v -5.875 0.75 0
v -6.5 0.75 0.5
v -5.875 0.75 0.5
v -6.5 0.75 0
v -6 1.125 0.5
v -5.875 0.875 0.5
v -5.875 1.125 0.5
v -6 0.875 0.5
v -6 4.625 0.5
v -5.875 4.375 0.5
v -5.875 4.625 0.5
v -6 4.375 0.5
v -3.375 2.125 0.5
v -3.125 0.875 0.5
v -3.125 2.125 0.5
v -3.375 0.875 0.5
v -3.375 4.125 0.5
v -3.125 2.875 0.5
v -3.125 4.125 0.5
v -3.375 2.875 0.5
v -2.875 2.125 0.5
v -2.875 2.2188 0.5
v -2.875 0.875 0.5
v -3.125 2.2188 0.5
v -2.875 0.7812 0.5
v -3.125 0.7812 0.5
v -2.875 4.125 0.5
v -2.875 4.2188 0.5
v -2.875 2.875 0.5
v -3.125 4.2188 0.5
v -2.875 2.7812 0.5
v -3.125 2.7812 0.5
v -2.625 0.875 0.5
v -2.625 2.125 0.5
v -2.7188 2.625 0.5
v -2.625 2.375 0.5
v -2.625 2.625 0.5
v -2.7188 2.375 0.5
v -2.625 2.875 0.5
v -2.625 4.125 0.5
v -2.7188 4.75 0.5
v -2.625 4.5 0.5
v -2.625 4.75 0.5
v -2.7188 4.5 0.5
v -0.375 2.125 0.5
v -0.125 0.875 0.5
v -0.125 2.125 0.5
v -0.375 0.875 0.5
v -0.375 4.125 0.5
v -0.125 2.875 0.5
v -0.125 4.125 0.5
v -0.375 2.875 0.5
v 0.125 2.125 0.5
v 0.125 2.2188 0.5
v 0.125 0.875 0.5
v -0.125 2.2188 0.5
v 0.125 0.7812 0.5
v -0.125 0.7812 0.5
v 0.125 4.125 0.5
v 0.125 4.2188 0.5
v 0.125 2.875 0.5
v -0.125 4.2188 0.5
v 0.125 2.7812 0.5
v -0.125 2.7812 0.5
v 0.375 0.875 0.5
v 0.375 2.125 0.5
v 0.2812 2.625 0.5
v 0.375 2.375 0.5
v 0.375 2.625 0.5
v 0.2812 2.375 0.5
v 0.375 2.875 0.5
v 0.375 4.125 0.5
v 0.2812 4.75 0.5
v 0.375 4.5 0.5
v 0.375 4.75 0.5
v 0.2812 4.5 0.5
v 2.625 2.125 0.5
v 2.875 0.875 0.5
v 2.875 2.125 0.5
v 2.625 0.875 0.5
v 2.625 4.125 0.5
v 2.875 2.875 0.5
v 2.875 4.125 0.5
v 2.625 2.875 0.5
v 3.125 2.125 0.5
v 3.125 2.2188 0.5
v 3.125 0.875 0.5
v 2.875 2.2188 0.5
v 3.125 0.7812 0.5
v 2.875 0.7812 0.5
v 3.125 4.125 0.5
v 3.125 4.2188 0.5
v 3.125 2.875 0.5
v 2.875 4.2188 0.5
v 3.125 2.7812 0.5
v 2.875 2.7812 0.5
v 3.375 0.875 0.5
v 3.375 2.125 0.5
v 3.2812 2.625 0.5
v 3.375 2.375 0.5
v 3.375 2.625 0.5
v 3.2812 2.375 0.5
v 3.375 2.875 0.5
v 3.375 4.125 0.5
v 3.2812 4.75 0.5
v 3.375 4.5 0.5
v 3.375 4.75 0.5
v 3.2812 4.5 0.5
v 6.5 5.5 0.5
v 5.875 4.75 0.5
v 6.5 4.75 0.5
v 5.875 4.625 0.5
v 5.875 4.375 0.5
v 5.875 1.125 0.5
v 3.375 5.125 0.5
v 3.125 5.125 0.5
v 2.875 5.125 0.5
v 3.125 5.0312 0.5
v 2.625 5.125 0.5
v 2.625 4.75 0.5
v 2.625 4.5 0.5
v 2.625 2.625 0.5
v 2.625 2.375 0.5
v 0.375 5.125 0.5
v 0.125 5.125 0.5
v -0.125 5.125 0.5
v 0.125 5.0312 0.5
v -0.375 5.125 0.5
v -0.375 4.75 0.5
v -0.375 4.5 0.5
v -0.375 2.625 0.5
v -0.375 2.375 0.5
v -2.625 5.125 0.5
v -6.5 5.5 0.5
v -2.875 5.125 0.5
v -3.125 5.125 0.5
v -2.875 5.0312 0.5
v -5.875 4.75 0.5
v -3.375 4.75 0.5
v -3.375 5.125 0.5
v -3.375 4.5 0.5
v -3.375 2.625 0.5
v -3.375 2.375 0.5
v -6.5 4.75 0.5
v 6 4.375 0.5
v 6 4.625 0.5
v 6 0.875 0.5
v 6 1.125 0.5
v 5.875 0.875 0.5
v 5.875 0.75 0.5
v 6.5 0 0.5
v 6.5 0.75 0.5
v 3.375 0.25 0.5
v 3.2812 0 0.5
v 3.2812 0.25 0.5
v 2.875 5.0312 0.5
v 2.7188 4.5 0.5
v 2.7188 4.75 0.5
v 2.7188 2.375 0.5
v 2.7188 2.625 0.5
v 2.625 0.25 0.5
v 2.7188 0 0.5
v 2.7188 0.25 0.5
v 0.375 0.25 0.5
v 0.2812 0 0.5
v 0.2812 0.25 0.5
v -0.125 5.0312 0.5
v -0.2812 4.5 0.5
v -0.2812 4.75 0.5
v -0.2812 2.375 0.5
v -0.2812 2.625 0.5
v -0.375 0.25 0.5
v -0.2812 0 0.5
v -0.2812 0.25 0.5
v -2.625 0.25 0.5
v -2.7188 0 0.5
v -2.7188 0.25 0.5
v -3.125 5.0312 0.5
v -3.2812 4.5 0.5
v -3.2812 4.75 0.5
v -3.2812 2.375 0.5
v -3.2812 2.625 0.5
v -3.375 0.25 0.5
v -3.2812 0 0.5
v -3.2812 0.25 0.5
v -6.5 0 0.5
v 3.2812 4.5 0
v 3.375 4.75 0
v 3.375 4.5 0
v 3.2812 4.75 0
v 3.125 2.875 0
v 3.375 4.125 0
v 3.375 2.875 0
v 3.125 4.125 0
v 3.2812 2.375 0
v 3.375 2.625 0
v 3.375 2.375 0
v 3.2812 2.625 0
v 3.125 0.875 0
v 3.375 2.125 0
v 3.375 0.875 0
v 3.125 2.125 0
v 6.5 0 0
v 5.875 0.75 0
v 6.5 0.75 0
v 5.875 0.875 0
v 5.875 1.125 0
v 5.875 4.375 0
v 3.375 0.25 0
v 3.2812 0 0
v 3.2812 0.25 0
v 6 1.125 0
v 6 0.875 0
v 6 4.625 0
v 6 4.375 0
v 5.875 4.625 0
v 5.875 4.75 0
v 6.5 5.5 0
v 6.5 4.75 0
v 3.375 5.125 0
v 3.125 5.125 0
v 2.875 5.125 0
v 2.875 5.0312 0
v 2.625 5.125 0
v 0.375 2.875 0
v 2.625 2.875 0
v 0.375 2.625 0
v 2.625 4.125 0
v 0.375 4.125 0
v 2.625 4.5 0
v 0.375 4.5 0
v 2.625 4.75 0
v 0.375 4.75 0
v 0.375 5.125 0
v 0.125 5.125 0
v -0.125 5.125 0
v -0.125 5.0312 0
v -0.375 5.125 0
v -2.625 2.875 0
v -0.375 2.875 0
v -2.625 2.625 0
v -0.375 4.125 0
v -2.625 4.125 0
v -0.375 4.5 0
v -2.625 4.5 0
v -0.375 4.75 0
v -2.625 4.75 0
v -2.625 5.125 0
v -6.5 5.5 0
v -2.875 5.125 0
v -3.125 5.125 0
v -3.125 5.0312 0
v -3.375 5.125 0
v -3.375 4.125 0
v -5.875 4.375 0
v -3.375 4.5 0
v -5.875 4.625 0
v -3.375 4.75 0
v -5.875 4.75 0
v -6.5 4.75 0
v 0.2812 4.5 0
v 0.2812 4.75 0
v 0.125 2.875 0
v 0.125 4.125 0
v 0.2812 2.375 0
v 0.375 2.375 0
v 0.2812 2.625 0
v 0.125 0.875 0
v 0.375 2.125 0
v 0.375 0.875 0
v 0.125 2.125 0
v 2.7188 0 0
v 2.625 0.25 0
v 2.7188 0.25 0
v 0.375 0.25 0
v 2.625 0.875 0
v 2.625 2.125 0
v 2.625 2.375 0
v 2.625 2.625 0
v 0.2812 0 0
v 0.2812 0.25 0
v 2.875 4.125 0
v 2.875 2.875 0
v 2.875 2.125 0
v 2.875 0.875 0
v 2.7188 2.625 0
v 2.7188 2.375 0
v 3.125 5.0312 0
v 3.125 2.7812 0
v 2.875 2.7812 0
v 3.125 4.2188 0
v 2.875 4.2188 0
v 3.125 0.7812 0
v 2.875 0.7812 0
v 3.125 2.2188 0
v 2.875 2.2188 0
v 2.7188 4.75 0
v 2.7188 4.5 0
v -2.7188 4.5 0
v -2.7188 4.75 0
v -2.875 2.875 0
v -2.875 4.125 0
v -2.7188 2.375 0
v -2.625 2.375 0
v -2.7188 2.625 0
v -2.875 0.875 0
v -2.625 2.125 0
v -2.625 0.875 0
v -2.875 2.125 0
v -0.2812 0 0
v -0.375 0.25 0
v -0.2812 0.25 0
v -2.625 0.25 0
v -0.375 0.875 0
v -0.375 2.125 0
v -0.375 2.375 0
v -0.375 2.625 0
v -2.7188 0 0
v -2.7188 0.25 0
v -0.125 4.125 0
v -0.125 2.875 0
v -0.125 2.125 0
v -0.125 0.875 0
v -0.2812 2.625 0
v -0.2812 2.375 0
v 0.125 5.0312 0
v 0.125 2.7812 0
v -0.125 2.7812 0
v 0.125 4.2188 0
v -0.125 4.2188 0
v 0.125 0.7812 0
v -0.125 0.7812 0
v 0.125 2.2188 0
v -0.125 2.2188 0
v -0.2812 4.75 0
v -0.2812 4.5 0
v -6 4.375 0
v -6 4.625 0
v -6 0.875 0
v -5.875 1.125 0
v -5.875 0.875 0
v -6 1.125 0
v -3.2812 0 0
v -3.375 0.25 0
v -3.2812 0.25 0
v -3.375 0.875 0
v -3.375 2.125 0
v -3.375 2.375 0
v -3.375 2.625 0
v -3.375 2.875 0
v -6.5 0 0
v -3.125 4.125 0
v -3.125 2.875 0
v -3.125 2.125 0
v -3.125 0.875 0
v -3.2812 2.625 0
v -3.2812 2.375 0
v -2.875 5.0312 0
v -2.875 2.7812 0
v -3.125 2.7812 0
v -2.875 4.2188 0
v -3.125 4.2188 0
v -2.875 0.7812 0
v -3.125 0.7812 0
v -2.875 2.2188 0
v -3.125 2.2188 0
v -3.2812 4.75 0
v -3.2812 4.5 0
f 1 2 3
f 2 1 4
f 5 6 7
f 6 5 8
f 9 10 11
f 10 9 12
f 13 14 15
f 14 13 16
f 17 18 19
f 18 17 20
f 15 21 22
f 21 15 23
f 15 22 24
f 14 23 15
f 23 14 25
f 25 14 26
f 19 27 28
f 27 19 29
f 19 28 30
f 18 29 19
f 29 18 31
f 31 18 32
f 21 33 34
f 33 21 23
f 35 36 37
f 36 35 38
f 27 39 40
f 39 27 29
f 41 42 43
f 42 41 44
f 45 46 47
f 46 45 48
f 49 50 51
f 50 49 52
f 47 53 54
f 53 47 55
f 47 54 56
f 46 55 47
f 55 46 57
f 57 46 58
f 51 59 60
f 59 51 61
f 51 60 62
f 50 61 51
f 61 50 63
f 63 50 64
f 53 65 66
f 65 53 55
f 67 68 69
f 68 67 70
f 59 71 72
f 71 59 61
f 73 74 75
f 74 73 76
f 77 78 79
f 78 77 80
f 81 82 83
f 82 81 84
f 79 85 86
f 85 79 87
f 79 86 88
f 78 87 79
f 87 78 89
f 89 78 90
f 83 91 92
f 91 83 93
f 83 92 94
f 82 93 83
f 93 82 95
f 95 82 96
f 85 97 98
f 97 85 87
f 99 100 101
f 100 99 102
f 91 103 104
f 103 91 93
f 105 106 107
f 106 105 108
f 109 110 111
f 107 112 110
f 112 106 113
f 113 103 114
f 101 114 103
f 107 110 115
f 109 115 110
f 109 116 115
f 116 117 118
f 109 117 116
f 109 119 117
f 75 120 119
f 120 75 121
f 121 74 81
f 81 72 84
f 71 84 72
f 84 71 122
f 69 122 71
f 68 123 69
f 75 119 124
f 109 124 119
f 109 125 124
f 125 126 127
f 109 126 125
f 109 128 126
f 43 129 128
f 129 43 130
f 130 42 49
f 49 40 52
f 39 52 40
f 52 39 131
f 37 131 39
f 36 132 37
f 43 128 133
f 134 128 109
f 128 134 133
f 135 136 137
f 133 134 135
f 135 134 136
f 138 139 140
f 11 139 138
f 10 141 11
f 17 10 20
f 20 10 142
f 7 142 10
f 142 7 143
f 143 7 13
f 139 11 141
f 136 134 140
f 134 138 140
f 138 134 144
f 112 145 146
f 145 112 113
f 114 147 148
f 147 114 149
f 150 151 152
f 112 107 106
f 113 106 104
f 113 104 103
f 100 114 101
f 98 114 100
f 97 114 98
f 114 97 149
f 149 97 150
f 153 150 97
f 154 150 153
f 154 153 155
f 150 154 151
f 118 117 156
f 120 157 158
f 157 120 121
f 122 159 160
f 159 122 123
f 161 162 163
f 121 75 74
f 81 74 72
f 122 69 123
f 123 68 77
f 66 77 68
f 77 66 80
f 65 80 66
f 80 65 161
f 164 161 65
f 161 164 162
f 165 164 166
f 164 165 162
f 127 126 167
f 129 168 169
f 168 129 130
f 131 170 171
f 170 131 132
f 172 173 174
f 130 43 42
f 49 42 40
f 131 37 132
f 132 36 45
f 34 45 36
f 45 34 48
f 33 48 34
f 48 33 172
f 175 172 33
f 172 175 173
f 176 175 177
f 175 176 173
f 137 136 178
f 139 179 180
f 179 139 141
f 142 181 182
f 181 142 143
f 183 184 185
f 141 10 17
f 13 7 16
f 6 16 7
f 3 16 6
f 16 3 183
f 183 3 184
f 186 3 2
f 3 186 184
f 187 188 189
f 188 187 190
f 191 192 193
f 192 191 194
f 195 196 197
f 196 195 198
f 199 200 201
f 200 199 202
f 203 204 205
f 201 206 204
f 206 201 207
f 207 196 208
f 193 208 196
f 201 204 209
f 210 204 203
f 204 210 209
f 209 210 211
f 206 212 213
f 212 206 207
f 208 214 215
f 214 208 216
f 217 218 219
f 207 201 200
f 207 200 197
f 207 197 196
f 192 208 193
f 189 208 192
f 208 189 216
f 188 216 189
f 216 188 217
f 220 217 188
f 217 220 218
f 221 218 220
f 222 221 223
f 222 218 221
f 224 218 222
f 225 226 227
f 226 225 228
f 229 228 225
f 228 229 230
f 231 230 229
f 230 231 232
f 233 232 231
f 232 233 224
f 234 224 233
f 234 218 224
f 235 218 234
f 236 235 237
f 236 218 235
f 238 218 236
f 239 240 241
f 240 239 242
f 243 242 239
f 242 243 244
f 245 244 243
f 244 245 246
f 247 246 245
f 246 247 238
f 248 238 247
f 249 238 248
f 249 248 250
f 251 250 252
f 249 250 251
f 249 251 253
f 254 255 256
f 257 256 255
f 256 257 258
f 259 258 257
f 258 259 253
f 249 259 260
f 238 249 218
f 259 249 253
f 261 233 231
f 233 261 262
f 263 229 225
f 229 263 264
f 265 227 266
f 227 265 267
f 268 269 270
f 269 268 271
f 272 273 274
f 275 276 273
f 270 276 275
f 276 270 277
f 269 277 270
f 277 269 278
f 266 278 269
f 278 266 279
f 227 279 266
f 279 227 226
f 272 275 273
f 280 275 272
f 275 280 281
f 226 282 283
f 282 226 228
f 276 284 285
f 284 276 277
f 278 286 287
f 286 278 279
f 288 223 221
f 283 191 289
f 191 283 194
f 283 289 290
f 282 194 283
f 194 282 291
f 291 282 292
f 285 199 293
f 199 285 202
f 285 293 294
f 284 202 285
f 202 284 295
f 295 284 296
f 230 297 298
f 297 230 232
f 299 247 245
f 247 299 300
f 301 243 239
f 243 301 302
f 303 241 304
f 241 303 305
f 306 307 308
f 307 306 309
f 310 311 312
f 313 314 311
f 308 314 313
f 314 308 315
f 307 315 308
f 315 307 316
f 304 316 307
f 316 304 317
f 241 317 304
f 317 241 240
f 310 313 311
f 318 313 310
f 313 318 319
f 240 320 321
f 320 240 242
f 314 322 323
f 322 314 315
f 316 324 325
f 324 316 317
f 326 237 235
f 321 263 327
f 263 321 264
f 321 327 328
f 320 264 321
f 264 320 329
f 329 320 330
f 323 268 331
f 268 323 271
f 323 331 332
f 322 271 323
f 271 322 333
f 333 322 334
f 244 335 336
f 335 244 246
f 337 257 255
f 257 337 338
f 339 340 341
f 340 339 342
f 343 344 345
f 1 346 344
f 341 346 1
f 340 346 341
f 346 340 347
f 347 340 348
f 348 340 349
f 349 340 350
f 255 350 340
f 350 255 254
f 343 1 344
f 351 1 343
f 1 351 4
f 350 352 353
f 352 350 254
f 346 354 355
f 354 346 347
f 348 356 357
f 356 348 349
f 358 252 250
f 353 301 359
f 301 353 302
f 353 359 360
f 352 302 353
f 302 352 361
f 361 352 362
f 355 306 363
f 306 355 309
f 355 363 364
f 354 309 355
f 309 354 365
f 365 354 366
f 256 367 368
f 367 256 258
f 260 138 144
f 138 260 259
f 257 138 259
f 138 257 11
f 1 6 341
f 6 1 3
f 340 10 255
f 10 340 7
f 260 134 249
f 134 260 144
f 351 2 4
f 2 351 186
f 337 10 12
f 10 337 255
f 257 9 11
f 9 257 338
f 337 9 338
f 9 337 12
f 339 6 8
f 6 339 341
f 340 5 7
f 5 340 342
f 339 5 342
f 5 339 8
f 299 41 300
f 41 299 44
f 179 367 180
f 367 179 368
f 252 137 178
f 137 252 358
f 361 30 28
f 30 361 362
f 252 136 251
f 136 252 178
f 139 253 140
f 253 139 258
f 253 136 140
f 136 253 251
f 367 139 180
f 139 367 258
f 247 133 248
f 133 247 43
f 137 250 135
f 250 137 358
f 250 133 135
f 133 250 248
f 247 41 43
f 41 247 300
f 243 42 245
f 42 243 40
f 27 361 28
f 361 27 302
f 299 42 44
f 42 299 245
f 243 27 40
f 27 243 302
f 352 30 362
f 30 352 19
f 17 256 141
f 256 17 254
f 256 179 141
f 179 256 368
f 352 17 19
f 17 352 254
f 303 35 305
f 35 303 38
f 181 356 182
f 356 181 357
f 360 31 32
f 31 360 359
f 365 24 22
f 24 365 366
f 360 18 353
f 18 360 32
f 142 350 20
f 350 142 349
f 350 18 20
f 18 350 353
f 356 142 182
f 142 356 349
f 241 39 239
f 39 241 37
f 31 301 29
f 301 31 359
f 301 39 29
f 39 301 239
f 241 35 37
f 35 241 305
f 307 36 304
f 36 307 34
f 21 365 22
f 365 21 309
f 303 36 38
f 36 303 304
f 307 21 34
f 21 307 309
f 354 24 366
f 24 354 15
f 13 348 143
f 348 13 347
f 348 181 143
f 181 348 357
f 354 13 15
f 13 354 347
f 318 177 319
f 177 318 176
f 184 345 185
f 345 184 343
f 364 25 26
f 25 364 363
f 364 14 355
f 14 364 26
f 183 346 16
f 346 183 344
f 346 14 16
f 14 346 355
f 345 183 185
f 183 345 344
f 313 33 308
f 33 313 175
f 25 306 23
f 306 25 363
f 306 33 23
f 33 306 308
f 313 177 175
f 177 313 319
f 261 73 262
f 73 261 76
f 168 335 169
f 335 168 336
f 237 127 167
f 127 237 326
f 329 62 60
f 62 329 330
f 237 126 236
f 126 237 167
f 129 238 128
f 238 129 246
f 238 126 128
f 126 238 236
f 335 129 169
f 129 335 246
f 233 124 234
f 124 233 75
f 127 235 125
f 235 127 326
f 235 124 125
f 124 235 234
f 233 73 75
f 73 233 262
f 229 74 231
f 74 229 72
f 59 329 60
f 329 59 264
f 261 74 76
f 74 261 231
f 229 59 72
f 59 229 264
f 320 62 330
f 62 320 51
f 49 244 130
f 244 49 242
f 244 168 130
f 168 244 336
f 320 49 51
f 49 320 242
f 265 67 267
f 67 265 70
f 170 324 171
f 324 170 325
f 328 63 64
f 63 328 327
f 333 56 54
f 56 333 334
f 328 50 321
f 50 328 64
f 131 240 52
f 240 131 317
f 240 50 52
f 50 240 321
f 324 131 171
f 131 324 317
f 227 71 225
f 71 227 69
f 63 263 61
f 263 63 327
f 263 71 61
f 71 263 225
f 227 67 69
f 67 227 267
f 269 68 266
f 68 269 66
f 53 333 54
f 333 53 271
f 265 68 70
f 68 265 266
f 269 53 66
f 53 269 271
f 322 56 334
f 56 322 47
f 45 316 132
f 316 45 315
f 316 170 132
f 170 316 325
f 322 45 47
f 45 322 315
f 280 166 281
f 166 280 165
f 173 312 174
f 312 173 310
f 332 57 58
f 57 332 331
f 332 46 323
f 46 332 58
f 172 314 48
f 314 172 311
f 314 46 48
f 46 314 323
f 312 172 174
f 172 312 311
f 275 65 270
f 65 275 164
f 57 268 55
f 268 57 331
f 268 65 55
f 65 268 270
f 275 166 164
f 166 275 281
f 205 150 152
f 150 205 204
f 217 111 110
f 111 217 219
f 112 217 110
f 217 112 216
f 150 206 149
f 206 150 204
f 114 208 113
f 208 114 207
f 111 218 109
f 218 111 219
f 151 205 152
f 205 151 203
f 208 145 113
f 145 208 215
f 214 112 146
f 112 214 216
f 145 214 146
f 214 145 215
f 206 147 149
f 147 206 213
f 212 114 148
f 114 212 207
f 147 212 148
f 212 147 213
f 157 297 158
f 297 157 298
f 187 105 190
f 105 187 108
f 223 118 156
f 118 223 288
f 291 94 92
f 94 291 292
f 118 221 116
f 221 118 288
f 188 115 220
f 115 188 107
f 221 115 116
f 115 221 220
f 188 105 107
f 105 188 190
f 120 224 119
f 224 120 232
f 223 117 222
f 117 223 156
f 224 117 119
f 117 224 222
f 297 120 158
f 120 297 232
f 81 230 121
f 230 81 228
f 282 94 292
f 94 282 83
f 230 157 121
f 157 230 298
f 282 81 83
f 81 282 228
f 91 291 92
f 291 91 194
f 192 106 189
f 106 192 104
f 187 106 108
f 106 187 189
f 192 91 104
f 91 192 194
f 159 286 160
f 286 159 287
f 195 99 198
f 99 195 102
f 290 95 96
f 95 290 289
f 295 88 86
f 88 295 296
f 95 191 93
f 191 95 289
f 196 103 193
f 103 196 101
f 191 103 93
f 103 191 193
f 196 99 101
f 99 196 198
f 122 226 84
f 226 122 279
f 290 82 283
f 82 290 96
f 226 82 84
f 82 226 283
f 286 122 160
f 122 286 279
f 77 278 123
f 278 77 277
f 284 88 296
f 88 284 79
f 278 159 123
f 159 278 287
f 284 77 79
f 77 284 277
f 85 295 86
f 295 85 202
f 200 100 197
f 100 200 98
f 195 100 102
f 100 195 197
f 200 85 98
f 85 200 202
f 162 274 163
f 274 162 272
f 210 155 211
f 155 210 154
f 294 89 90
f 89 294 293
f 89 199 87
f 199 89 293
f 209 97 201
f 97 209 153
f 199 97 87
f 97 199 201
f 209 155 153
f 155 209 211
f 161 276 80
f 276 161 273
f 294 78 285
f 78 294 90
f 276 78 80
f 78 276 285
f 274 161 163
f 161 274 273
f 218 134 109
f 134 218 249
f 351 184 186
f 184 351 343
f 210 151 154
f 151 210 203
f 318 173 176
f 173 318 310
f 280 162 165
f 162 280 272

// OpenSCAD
// file: modus.scad
//Corner Joint - allows the sides of two parts to create inlayed corner. Aids with welding.
//need to verify module math is the same throughout all parts.

module cornerjoint(Z,L,H,EndGap,PadL,PadH,CJangle,CJcenter){
    //change so that H = Z of inlayed part (usually 0.5)
    //add center and angle in degrees option, orgin far side of cut out area

     if((CJangle==0)&&(CJcenter==0))
      {    
        translate([0,0,0])
        rotate([0,0,CJangle])
        difference(){
        cube([L,H+PadH,Z]);
        translate([EndGap,H,0])
        cube([PadL,PadH,Z]);
        translate([L-EndGap-PadL,H,0])
        cube([PadL,PadH,Z]);}
      }    
else if((CJangle==90)&&(CJcenter==0))
      {    
        translate([H+PadH,0,0])
        rotate([0,0,CJangle])
        difference(){
        cube([L,H+PadH,Z]);
        translate([EndGap,H,0])
        cube([PadL,PadH,Z]);
        translate([L-EndGap-PadL,H,0])
        cube([PadL,PadH,Z]);}
      }
else if((CJangle==180)&&(CJcenter==0))       
      {    
        translate([L,H+PadH,0])
        rotate([0,0,CJangle])
        difference(){
        cube([L,H+PadH,Z]);
        translate([EndGap,H,0])
        cube([PadL,PadH,Z]);
        translate([L-EndGap-PadL,H,0])
        cube([PadL,PadH,Z]);}
      }
else if((CJangle==270)&&(CJcenter==0))
      {    
        translate([0,L,0])
        rotate([0,0,CJangle])
        difference(){
        cube([L,H+PadH,Z]);
        translate([EndGap,H,0])
        cube([PadL,PadH,Z]);
        translate([L-EndGap-PadL,H,0])
        cube([PadL,PadH,Z]);}
      }  
      
//centered     
   
else if((CJangle==0)&&(CJcenter==1))
      {    
        translate([-L/2,0,0])
        rotate([0,0,CJangle])
        difference(){
        cube([L,H+PadH,Z]);
        translate([EndGap,H,0])
        cube([PadL,PadH,Z]);
        translate([L-EndGap-PadL,H,0])
        cube([PadL,PadH,Z]);}
      }  
else if((CJangle==90)&&(CJcenter==1))
      {    
        translate([0,-L/2,0])
        rotate([0,0,CJangle])
        difference(){
        cube([L,H+PadH,Z]);
        translate([EndGap,H,0])
        cube([PadL,PadH,Z]);
        translate([L-EndGap-PadL,H,0])
        cube([PadL,PadH,Z]);}
      }
else if((CJangle==180)&&(CJcenter==1))       
      {    
        translate([L/2,0,0])
        rotate([0,0,CJangle])
        difference(){
        cube([L,H+PadH,Z]);
        translate([EndGap,H,0])
        cube([PadL,PadH,Z]);
        translate([L-EndGap-PadL,H,0])
        cube([PadL,PadH,Z]);}
      }
else if((CJangle==270)&&(CJcenter==1))
      {    
        translate([0,L/2,0])
        rotate([0,0,CJangle])
        difference(){
        cube([L,H+PadH,Z]);
        translate([EndGap,H,0])
        cube([PadL,PadH,Z]);
        translate([L-EndGap-PadL,H,0])
        cube([PadL,PadH,Z]);}
      }
} //end cornerjoint module

//Tab Insert - used to cut a hole for an abutting part to insert into. Typically aids with welding the two parts.
module tabinsert(X,Y,Z,dGap,cGap,c1,c2,c3,c4,c5,c6,c7,c8,center){
    translate([-dGap-(center*(X/2)),-dGap-(center*(Y/2)),0]){
        //main cut
        cube([X+(dGap*2),Y+(dGap*2),Z]);
        //corner c1c2
        translate([-cGap,(Y+(dGap*2))-c1+cGap,0])
            {
        cube([c2,c1,Z]);}
       //corner c3c4
       translate([(X+(dGap*2))-c3+cGap,(Y+(dGap*2))-c4+cGap,0]){
           cube([c3,c4,Z]);
       }
       //corner c5c6
       translate([(X+(dGap*2))-c6+cGap,-cGap,0])
      {
          cube([c6,c5,Z]);
      }
       
       //corner c7c8 
       translate([-cGap,-cGap,0]){
           cube([c7,c8,Z]);
       }
    
    } //end center translate
} //end tabinsert module
 
// file: vars.scad
brickW=6; 
brickL=12;
brickCH=6;

$fn=8; //defines resolution of circles. 8 is okay for review. 100  or greater should be used for for final dxf export.

dZstandard=0.5; //thickness of steel to be cut for drawer parts
fZstandard=0.5;
aZstandard=0.5; //thickness of steel to be cut for arm parts

fBOLTHOLEstandardD=1; //standard bolts used on frame
sliderodholeOD=1.2; 

dGap=0.03125; //gap between a hole cut's edge and the part sitting within the hole. //D3 appears to use 0.3125, is this in error?

//all parts set to standard thickness below
//off standard preferences can be defined below

//drawer
drawergap=0.0283;  //extra room for drawer to slide in the space between f1 and f4
drawerHgap=0.1884;  //total extra space from drawer sides to frame walls. sum of both sides.

d1z=dZstandard;
d2z=dZstandard;
d3z=dZstandard;
d4z=dZstandard;
d5z=dZstandard;
d6z=dZstandard;
d5z=dZstandard;
d7z=dZstandard;
d8z=dZstandard;
d9z=dZstandard;

//frame
f1x=24.2;
f1y=6;
f1z=0.5;


f2y=3.5;
f2z=fZstandard;

f3x=f1x;
f3y=3.5;
f3z=fZstandard;

f4y=11;
f4z=fZstandard;

f5y=3.5;
f5z=fZstandard;

f6y=8;
f6z=fZstandard;

f8y=brickW;
f8z=fZstandard;
f8boltD=1;

f9y=4.5;
f9x=43.5;  //set based on MAINcylinder
f9z=fZstandard;

f8x=f9x;

f11x=1.25;
f11z=fZstandard;

f13z=fZstandard;

//arms

a1x=4;
a1y=72; //calculate based on drawer cylinder
a1z=aZstandard;

a2x=6;
a2y=72;  //calculate based on drawer cylinder
a2z=aZstandard;

a4z=aZstandard;
a6z=aZstandard;

//
//Input your main cylinder's dimenions here
//
cylinderMAINminC2E=0; //main hydraulic cylinder's distance from center of mounting hole to the end of the shaft when fully compressed.
cylinderMAINmaxC2E=0; //main hydraulic cylinder's distance from center of mounting hole to the end of the shaft when fully extended.

//
//Input your drawer cylinder's dimenions here
//
cylinderDRAWERbodyH=3; //measured when in position, largest length from top to bottom of cylinder
cylinderDRAWERminC2C=0; //drawer's hydraulic cylinder's distance from the center of one mounting hole to the center of the other when fully compressed.
cylinderDRAWERmaxC2C=0; ///drawer's hydraulic cylinder's distance from the center of one mounting hole to the center of the other when fully extended.
cylinderDRAWERrodclevisW=2.5; //width of cylinders' clevis on end of rod
cylinderDRAWERrodclevisID=1;
cylinderDRAWERrodclevisOD=2;
cylinderDRAWERrearclevisW=2.5; //width of mounting clevis cylinder body
cylinderDRAWERrearclevisID=1;
cylinderDRAWERrearclevisOD=2;
cylinderDRAWERrearclevisClearance=3; //usable space around rear clevis pin (in diameter). be aware of hyraulic fittings.

//the following variables are calculated in order of dependence on preceding variables
d3x=brickL+(d2z*2);
d3y=brickCH-d1z;
d4x=brickW+d3z+d3z;
d4y=brickCH-d1z;
d5x=brickL+(d2z*2);
d5y=brickW;
d6x=brickL+(d2z*2);
d6y=brickCH;
d7x=cylinderDRAWERrearclevisClearance;
d7y=a4z+d8z+cylinderDRAWERbodyH;
d9x=cylinderDRAWERbodyH+d6z;
d9y=cylinderDRAWERbodyH+d8z;
d8x=brickL+(d2z*2);
d8y=max(5,(d9x-d6z));   //need to review fundamentals, 5 minimun unless d9 gets larger than d8
d1x=18.5;   //need to come up with a formula
d1y=18;     //need to come up with a formula
d2x=d8y+d6z+brickW+d3z+d5y+d3z;
d2y=brickCH;

f11y=f8y;
f6x=brickL+(d2z*2)+(f9y*2)+drawerHgap;
f8x=43.5;  //need to define based on MAINcylinder inputs


f2x=brickL+(d2z*2)+drawerHgap+(f9y*2)-(1.4*2);  //distance between large cut outs in f9

f5x=brickL+(d2z*2)+drawerHgap+(f9y*2)+(a1x*2); //distance between outer edges of each A1

f4x=f5x-0.5;   //same as f5 but minus 0.25 on each side to give a little overhang
// main file
include <vars.scad>;
use <modus.scad>;

//this part is rendered upside down from placement

d3p();

module d3p(){

difference(){
translate([-(d3x/2),0,0])
cube([d3x,d3y,d3z]);
translate([-(d3x/2),0,0])
cuts();
translate([(d3x/2),0,0])
mirror([1,0,0])
cuts();
} //end difference

module cuts(){
    translate([0,d3y/2,0])
    cornerjoint(d3z,d3y-(0.75*2),d2z,0.125,0.25,0.125,270,1);    
    
    //outer columns tab inserts
    
    translate([(brickL/4)+d2z,d3y-d5z-(0.75/2),0])
    tabinsert(d4z,0.75,d3z,dGap,0.09375,0.375,0.25,0.25,0.375,0.375,0.25,0.25,0.375,1);
    translate([(brickL/4)+d2z,((d4y-d5z)/2),0])
    tabinsert(d4z,0.5,d3z,dGap,0.09375,0.25,0.25,0.25,0.25,0.25,0.25,0.25,0.25,1);
    translate([(brickL/4)+d2z,0,0])
    tabinsert(d4z,(0.75*2),d3z,dGap,0.09375,0.625,0.25,0.25,0.625,0,0,0,0,1);
    
    //center column tab inserts
    
    translate([d3x/2,d3y-d5z-(0.75/2),0])
    tabinsert(d4z,0.75,d3z,dGap,0.09375,0.375,0.25,0.25,0.375,0.375,0.25,0.25,0.375,1); 
    translate([d3x/2,((d4y-d5z)/2),0])
    tabinsert(d4z,0.5,d3z,dGap,0.09375,0.25,0.25,0.25,0.25,0.25,0.25,0.25,0.25,1);
    translate([d3x/2,0,0])
    tabinsert(d4z,(0.75*2),d3z,dGap,0.09375,0.625,0.25,0.25,0.625,0,0,0,0,1);
    
} //end cuts module

} //end d3p module
